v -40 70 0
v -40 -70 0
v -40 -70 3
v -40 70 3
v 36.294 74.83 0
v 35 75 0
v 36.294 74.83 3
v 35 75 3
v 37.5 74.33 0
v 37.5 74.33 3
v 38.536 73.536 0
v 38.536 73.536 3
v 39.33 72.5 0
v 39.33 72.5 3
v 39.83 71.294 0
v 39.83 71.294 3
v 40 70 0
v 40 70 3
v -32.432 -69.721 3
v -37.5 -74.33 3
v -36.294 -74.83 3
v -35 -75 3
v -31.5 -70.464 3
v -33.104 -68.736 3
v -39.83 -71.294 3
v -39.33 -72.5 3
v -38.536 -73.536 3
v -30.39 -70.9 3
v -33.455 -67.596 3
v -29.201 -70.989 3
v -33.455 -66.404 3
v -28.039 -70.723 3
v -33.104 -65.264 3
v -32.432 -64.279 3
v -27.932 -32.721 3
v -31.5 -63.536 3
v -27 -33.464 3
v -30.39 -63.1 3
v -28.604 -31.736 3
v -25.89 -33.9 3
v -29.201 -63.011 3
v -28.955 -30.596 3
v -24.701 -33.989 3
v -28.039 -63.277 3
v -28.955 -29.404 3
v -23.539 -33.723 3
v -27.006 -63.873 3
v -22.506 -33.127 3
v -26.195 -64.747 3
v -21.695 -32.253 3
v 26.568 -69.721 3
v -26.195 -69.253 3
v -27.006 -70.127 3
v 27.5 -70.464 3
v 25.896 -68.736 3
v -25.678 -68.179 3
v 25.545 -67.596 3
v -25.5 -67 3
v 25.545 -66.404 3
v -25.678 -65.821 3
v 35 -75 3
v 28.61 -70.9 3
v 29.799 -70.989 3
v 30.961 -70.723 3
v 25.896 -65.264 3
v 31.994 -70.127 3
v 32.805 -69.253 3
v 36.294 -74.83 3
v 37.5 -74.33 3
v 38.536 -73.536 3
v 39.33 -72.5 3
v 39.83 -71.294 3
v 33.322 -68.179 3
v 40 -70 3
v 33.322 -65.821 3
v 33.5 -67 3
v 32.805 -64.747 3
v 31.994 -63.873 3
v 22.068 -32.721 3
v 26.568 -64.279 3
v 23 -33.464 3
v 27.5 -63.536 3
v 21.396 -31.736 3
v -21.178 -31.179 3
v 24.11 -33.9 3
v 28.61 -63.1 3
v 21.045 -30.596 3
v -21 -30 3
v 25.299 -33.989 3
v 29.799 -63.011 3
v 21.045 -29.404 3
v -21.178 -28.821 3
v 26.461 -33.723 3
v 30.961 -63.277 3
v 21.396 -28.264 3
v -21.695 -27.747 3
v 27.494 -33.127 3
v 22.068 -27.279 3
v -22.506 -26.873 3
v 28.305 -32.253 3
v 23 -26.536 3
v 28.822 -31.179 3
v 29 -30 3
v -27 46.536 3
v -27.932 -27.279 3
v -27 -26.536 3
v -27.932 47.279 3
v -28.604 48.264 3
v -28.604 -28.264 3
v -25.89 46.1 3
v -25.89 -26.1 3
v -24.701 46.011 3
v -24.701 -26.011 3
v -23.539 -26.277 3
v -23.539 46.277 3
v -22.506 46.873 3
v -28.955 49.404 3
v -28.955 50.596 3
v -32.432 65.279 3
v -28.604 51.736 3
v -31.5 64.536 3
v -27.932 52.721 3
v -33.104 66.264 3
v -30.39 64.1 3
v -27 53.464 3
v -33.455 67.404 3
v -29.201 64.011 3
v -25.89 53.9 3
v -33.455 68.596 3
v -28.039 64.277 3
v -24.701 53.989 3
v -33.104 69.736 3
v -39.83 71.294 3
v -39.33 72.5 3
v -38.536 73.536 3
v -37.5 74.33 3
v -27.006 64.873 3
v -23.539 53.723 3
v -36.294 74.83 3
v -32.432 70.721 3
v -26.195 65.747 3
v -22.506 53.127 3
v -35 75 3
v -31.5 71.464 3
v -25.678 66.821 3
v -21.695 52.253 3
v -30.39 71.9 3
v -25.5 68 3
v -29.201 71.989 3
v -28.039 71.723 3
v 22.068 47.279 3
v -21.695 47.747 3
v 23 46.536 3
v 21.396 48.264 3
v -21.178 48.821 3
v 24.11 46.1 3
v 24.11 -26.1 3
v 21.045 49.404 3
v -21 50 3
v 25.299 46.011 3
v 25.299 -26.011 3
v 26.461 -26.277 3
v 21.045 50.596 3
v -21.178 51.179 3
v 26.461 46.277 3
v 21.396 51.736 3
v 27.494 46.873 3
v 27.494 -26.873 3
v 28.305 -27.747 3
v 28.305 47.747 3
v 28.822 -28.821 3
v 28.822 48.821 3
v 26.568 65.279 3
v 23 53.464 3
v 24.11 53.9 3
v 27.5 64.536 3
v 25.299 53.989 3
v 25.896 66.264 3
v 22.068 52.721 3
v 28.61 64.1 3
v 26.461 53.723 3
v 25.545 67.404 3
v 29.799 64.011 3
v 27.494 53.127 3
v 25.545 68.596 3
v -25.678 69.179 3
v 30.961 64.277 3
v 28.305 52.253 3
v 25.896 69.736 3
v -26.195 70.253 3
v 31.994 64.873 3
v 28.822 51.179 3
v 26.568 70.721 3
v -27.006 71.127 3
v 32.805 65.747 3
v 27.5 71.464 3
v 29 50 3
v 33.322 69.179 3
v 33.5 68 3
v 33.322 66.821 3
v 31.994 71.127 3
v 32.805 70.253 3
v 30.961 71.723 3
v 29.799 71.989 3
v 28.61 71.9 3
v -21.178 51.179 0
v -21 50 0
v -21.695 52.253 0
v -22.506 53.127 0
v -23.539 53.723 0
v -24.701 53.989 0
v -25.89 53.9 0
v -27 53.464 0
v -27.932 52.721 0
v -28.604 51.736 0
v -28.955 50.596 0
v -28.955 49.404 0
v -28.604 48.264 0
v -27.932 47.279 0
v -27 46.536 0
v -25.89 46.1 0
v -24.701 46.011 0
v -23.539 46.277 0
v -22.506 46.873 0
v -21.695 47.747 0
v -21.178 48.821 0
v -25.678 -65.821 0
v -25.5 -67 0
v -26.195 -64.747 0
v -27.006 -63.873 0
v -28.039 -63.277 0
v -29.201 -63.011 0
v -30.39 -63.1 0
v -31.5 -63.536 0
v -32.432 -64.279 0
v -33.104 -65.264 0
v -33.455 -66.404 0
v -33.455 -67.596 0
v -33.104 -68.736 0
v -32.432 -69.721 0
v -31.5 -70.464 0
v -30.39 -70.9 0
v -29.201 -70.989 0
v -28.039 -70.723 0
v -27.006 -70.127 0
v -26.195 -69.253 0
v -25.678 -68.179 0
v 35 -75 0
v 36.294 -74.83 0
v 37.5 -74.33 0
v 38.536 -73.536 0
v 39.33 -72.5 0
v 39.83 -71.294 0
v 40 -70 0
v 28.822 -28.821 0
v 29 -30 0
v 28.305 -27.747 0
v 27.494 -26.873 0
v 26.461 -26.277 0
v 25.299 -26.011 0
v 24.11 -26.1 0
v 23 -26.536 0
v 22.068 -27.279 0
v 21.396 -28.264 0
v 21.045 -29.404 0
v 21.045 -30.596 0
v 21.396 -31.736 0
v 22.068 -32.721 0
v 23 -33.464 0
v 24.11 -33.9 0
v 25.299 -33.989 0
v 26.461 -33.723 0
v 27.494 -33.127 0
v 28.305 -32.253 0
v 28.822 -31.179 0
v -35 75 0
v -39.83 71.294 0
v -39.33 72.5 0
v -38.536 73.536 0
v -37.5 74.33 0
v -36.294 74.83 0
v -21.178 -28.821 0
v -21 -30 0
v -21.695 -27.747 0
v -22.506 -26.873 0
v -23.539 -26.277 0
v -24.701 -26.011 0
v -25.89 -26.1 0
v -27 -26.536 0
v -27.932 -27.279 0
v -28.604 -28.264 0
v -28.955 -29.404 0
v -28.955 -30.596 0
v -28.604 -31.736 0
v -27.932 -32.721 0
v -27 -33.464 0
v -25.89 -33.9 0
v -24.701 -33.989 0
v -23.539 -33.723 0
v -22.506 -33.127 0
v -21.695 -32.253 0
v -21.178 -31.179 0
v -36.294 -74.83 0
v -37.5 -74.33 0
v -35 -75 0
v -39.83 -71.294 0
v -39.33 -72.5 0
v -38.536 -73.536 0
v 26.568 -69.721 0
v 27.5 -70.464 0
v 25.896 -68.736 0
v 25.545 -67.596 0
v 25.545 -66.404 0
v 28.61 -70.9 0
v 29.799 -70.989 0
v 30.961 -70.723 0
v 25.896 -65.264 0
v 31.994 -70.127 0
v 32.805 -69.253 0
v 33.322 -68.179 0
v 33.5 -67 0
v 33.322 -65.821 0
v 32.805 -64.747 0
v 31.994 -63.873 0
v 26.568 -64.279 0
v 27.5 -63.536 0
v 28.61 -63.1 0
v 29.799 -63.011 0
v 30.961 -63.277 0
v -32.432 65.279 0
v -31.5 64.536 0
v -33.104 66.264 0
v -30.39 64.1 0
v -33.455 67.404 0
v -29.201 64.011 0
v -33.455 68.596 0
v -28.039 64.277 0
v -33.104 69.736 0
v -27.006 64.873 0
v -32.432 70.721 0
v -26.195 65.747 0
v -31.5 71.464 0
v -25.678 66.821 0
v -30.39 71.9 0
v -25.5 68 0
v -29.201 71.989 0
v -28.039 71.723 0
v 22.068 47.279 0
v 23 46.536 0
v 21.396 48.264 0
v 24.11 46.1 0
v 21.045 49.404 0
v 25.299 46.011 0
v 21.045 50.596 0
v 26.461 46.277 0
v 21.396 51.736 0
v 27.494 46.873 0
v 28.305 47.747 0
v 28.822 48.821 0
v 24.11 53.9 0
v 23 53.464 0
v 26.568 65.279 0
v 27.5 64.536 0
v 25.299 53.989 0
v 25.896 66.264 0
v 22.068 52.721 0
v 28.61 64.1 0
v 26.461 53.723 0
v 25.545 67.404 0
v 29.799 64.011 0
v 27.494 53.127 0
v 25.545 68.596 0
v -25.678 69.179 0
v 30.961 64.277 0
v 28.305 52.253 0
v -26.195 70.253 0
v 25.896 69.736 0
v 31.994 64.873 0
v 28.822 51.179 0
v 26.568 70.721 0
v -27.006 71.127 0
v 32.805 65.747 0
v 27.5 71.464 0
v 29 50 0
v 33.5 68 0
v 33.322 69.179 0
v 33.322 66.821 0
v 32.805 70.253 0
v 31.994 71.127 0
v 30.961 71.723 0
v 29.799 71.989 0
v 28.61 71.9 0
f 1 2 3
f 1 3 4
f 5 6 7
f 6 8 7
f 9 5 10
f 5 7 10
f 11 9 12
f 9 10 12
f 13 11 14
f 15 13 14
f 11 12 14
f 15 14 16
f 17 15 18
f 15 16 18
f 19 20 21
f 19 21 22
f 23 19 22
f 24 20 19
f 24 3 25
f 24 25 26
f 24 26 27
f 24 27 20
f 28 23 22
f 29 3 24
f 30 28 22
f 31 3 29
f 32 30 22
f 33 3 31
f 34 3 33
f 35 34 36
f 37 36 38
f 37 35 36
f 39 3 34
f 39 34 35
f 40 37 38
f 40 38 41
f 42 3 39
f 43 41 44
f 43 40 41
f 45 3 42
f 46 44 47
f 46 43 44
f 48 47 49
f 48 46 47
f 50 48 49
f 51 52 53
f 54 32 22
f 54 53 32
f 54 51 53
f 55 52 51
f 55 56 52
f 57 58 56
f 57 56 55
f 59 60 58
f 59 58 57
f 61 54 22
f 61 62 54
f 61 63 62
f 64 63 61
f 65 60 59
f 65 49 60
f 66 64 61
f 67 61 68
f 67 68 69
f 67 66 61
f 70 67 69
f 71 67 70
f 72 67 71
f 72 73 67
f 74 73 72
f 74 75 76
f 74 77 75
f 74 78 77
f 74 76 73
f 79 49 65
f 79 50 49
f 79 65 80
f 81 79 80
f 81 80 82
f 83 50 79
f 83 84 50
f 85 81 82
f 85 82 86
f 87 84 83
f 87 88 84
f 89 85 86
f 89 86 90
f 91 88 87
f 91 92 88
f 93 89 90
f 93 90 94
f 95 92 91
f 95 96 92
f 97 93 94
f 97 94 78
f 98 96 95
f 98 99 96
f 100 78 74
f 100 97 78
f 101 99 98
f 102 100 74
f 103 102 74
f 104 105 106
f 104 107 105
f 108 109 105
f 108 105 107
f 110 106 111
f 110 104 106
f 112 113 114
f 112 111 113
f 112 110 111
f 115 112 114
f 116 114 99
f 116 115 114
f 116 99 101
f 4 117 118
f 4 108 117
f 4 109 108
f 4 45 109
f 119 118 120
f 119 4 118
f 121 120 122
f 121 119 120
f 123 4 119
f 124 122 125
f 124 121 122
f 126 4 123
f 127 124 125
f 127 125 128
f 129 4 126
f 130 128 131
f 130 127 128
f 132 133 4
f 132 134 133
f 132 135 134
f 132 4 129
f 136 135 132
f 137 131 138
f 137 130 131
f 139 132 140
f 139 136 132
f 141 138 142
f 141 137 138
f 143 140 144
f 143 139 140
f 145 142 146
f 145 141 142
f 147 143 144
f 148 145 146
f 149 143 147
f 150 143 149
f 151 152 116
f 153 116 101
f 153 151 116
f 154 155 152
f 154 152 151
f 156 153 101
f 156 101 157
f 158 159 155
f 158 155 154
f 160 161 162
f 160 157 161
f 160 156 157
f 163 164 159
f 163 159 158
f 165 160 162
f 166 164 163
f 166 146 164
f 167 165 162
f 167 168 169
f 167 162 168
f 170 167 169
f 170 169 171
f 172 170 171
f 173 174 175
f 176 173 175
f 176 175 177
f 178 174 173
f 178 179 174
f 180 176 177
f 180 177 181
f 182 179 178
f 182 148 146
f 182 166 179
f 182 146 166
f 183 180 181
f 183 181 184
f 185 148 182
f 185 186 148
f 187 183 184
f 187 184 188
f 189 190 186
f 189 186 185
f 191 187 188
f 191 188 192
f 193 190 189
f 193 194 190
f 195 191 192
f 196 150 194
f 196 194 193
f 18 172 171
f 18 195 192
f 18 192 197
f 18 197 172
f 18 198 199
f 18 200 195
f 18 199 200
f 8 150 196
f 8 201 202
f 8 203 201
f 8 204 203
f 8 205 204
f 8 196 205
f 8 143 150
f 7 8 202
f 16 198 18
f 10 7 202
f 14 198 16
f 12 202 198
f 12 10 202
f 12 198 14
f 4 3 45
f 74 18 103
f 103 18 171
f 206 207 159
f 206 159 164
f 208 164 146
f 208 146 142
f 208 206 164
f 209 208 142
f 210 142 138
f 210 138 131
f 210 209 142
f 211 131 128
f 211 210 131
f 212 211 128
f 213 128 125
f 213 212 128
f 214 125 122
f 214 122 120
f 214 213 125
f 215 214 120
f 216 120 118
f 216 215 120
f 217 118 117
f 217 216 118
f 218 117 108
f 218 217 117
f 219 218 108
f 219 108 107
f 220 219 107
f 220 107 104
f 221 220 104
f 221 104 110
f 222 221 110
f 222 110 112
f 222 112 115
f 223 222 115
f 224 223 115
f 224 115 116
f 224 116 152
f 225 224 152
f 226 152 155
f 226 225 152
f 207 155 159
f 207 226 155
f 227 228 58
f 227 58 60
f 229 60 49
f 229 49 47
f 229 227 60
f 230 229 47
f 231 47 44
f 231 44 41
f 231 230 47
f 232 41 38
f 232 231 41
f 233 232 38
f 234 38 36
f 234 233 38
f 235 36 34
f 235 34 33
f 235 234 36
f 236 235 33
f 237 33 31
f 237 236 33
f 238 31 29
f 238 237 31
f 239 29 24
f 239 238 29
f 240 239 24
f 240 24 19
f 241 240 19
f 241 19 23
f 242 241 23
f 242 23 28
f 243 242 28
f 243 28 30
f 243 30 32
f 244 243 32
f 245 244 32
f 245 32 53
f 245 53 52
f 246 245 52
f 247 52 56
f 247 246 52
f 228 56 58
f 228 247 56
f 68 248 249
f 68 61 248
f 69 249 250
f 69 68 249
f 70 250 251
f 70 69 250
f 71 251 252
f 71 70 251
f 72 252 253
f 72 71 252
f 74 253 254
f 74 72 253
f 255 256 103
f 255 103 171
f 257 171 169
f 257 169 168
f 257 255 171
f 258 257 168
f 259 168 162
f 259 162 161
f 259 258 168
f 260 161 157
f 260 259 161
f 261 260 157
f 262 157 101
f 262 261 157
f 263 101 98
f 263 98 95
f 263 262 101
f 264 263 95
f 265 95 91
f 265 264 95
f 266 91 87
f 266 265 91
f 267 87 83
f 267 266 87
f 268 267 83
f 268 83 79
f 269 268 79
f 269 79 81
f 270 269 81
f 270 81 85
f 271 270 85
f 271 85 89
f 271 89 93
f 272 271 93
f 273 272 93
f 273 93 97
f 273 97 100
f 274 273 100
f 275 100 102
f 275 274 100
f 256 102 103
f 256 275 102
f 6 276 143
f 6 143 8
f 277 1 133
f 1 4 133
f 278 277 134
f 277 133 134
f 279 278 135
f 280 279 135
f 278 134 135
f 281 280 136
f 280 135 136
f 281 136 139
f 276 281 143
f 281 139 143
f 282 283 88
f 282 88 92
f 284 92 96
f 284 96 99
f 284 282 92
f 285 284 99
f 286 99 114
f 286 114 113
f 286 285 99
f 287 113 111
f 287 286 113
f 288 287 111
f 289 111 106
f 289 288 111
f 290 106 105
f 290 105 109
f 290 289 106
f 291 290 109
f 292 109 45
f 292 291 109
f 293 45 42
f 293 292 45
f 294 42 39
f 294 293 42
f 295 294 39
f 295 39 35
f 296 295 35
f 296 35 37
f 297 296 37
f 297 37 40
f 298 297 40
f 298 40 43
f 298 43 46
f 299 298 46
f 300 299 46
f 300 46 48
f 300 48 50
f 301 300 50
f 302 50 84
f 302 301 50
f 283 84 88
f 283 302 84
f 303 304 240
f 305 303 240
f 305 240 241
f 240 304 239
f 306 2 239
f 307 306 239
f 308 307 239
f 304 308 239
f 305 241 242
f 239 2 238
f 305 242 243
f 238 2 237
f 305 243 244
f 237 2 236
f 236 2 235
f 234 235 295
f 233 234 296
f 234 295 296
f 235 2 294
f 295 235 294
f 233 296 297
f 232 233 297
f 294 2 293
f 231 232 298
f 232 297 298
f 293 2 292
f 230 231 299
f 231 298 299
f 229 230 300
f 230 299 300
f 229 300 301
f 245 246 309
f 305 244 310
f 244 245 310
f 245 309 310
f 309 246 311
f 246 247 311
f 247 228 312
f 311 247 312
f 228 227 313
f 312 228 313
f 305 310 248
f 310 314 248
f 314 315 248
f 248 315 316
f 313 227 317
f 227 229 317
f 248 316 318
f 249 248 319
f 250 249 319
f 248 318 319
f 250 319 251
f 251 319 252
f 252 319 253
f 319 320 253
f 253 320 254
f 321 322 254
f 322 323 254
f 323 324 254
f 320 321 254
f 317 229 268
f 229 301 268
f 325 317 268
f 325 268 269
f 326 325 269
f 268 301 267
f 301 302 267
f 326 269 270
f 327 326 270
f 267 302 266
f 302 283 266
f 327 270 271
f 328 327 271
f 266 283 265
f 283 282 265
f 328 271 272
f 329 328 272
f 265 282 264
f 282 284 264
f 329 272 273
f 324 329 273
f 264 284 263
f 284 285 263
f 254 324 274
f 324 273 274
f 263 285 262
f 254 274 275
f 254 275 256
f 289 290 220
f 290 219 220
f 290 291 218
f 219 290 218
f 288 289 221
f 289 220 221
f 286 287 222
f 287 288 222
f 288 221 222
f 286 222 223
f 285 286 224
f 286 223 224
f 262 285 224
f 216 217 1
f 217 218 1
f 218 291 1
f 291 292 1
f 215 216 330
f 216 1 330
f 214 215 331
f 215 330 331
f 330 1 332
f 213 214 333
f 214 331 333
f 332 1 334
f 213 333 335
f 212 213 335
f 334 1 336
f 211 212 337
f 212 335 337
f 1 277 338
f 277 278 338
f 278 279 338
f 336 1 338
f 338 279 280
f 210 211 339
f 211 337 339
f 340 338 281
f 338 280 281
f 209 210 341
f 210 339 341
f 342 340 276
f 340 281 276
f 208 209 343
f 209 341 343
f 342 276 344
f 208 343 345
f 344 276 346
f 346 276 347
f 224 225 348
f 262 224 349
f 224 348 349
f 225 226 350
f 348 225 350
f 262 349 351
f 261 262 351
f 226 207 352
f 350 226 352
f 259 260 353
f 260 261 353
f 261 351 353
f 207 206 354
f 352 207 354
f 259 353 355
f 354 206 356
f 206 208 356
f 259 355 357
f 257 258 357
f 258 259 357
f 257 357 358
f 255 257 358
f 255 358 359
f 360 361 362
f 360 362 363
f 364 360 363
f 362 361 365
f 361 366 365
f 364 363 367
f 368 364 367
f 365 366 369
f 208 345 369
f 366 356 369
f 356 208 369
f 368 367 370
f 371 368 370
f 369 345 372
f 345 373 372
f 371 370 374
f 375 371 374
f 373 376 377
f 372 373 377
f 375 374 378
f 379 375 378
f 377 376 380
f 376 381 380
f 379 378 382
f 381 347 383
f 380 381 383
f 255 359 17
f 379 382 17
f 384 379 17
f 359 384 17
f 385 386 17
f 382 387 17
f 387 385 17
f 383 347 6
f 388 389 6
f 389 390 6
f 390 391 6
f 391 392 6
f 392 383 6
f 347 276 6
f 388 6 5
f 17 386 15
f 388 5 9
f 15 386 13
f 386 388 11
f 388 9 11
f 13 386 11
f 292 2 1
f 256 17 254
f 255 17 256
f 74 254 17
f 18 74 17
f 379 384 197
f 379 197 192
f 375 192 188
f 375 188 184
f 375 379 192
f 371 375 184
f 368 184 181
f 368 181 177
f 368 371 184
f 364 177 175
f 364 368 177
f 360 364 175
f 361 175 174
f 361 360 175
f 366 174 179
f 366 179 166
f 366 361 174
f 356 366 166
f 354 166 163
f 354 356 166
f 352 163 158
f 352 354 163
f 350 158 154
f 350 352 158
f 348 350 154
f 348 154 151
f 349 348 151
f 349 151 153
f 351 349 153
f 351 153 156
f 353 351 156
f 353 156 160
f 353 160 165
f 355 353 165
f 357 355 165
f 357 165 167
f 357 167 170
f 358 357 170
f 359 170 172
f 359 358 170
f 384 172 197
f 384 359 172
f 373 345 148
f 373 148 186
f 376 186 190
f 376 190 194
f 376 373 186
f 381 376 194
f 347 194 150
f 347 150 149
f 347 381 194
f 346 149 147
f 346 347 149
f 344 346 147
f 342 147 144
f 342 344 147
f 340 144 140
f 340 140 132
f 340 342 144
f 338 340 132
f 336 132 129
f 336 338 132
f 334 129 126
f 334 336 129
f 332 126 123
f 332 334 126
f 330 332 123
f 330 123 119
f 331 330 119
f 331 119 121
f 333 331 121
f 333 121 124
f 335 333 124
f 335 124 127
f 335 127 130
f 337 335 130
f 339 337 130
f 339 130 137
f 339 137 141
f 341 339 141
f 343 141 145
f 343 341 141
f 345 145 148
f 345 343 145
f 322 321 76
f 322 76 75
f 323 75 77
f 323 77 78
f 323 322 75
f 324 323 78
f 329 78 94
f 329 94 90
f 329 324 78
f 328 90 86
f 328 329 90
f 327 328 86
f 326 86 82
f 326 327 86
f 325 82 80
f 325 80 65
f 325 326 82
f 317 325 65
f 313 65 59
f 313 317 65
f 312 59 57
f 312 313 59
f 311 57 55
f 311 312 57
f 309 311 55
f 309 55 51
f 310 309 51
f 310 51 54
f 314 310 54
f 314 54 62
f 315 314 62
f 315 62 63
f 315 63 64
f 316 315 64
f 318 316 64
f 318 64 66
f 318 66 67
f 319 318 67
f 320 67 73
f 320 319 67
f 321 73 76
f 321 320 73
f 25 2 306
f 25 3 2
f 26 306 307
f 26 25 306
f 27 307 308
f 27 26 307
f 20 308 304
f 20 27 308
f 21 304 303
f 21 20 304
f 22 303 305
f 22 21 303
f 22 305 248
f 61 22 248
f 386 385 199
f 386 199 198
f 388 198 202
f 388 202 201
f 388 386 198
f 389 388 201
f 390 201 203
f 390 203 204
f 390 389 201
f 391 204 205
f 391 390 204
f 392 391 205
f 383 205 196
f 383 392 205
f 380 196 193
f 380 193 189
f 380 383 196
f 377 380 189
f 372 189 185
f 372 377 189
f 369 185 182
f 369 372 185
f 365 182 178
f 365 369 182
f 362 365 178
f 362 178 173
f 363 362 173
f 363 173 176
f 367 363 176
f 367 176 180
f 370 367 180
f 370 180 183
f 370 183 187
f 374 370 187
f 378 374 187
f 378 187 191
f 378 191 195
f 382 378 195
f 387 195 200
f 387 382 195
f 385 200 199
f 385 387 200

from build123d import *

# Parameters (mm, degrees)
SKETCH1_W           = 80
SKETCH1_H           = 150
SKETCH1_R           = 4
BOSS_EXTRUDE1_DEPTH = 3
FILLET3_R           = 5


with BuildPart() as part:
    # Sketch1 → Boss-Extrude1 (new body)
    with BuildSketch(Plane.XY):
        Rectangle(SKETCH1_W, SKETCH1_H)
        with Locations((-29.5, 68)):
            Circle(SKETCH1_R, mode=Mode.SUBTRACT)
        with Locations((29.5, 68)):
            Circle(SKETCH1_R, mode=Mode.SUBTRACT)
        with Locations((29.5, -67)):
            Circle(SKETCH1_R, mode=Mode.SUBTRACT)
        with Locations((-29.5, -67)):
            Circle(SKETCH1_R, mode=Mode.SUBTRACT)
        with Locations((-25, 50)):
            Circle(SKETCH1_R, mode=Mode.SUBTRACT)
        with Locations((25, 50)):
            Circle(SKETCH1_R, mode=Mode.SUBTRACT)
        with Locations((25, -30)):
            Circle(SKETCH1_R, mode=Mode.SUBTRACT)
        with Locations((-25, -30)):
            Circle(SKETCH1_R, mode=Mode.SUBTRACT)
    extrude(amount=BOSS_EXTRUDE1_DEPTH)

    # Fillet3
    fillet3_edges = [part.edges().sort_by_distance(p)[0] for p in [
        (40, -75, 1.5),
        (-40, -75, 1.5),
        (-40, 75, 1.5),
        (40, 75, 1.5),
    ]]
    fillet(fillet3_edges, radius=FILLET3_R)


solid = part.part
